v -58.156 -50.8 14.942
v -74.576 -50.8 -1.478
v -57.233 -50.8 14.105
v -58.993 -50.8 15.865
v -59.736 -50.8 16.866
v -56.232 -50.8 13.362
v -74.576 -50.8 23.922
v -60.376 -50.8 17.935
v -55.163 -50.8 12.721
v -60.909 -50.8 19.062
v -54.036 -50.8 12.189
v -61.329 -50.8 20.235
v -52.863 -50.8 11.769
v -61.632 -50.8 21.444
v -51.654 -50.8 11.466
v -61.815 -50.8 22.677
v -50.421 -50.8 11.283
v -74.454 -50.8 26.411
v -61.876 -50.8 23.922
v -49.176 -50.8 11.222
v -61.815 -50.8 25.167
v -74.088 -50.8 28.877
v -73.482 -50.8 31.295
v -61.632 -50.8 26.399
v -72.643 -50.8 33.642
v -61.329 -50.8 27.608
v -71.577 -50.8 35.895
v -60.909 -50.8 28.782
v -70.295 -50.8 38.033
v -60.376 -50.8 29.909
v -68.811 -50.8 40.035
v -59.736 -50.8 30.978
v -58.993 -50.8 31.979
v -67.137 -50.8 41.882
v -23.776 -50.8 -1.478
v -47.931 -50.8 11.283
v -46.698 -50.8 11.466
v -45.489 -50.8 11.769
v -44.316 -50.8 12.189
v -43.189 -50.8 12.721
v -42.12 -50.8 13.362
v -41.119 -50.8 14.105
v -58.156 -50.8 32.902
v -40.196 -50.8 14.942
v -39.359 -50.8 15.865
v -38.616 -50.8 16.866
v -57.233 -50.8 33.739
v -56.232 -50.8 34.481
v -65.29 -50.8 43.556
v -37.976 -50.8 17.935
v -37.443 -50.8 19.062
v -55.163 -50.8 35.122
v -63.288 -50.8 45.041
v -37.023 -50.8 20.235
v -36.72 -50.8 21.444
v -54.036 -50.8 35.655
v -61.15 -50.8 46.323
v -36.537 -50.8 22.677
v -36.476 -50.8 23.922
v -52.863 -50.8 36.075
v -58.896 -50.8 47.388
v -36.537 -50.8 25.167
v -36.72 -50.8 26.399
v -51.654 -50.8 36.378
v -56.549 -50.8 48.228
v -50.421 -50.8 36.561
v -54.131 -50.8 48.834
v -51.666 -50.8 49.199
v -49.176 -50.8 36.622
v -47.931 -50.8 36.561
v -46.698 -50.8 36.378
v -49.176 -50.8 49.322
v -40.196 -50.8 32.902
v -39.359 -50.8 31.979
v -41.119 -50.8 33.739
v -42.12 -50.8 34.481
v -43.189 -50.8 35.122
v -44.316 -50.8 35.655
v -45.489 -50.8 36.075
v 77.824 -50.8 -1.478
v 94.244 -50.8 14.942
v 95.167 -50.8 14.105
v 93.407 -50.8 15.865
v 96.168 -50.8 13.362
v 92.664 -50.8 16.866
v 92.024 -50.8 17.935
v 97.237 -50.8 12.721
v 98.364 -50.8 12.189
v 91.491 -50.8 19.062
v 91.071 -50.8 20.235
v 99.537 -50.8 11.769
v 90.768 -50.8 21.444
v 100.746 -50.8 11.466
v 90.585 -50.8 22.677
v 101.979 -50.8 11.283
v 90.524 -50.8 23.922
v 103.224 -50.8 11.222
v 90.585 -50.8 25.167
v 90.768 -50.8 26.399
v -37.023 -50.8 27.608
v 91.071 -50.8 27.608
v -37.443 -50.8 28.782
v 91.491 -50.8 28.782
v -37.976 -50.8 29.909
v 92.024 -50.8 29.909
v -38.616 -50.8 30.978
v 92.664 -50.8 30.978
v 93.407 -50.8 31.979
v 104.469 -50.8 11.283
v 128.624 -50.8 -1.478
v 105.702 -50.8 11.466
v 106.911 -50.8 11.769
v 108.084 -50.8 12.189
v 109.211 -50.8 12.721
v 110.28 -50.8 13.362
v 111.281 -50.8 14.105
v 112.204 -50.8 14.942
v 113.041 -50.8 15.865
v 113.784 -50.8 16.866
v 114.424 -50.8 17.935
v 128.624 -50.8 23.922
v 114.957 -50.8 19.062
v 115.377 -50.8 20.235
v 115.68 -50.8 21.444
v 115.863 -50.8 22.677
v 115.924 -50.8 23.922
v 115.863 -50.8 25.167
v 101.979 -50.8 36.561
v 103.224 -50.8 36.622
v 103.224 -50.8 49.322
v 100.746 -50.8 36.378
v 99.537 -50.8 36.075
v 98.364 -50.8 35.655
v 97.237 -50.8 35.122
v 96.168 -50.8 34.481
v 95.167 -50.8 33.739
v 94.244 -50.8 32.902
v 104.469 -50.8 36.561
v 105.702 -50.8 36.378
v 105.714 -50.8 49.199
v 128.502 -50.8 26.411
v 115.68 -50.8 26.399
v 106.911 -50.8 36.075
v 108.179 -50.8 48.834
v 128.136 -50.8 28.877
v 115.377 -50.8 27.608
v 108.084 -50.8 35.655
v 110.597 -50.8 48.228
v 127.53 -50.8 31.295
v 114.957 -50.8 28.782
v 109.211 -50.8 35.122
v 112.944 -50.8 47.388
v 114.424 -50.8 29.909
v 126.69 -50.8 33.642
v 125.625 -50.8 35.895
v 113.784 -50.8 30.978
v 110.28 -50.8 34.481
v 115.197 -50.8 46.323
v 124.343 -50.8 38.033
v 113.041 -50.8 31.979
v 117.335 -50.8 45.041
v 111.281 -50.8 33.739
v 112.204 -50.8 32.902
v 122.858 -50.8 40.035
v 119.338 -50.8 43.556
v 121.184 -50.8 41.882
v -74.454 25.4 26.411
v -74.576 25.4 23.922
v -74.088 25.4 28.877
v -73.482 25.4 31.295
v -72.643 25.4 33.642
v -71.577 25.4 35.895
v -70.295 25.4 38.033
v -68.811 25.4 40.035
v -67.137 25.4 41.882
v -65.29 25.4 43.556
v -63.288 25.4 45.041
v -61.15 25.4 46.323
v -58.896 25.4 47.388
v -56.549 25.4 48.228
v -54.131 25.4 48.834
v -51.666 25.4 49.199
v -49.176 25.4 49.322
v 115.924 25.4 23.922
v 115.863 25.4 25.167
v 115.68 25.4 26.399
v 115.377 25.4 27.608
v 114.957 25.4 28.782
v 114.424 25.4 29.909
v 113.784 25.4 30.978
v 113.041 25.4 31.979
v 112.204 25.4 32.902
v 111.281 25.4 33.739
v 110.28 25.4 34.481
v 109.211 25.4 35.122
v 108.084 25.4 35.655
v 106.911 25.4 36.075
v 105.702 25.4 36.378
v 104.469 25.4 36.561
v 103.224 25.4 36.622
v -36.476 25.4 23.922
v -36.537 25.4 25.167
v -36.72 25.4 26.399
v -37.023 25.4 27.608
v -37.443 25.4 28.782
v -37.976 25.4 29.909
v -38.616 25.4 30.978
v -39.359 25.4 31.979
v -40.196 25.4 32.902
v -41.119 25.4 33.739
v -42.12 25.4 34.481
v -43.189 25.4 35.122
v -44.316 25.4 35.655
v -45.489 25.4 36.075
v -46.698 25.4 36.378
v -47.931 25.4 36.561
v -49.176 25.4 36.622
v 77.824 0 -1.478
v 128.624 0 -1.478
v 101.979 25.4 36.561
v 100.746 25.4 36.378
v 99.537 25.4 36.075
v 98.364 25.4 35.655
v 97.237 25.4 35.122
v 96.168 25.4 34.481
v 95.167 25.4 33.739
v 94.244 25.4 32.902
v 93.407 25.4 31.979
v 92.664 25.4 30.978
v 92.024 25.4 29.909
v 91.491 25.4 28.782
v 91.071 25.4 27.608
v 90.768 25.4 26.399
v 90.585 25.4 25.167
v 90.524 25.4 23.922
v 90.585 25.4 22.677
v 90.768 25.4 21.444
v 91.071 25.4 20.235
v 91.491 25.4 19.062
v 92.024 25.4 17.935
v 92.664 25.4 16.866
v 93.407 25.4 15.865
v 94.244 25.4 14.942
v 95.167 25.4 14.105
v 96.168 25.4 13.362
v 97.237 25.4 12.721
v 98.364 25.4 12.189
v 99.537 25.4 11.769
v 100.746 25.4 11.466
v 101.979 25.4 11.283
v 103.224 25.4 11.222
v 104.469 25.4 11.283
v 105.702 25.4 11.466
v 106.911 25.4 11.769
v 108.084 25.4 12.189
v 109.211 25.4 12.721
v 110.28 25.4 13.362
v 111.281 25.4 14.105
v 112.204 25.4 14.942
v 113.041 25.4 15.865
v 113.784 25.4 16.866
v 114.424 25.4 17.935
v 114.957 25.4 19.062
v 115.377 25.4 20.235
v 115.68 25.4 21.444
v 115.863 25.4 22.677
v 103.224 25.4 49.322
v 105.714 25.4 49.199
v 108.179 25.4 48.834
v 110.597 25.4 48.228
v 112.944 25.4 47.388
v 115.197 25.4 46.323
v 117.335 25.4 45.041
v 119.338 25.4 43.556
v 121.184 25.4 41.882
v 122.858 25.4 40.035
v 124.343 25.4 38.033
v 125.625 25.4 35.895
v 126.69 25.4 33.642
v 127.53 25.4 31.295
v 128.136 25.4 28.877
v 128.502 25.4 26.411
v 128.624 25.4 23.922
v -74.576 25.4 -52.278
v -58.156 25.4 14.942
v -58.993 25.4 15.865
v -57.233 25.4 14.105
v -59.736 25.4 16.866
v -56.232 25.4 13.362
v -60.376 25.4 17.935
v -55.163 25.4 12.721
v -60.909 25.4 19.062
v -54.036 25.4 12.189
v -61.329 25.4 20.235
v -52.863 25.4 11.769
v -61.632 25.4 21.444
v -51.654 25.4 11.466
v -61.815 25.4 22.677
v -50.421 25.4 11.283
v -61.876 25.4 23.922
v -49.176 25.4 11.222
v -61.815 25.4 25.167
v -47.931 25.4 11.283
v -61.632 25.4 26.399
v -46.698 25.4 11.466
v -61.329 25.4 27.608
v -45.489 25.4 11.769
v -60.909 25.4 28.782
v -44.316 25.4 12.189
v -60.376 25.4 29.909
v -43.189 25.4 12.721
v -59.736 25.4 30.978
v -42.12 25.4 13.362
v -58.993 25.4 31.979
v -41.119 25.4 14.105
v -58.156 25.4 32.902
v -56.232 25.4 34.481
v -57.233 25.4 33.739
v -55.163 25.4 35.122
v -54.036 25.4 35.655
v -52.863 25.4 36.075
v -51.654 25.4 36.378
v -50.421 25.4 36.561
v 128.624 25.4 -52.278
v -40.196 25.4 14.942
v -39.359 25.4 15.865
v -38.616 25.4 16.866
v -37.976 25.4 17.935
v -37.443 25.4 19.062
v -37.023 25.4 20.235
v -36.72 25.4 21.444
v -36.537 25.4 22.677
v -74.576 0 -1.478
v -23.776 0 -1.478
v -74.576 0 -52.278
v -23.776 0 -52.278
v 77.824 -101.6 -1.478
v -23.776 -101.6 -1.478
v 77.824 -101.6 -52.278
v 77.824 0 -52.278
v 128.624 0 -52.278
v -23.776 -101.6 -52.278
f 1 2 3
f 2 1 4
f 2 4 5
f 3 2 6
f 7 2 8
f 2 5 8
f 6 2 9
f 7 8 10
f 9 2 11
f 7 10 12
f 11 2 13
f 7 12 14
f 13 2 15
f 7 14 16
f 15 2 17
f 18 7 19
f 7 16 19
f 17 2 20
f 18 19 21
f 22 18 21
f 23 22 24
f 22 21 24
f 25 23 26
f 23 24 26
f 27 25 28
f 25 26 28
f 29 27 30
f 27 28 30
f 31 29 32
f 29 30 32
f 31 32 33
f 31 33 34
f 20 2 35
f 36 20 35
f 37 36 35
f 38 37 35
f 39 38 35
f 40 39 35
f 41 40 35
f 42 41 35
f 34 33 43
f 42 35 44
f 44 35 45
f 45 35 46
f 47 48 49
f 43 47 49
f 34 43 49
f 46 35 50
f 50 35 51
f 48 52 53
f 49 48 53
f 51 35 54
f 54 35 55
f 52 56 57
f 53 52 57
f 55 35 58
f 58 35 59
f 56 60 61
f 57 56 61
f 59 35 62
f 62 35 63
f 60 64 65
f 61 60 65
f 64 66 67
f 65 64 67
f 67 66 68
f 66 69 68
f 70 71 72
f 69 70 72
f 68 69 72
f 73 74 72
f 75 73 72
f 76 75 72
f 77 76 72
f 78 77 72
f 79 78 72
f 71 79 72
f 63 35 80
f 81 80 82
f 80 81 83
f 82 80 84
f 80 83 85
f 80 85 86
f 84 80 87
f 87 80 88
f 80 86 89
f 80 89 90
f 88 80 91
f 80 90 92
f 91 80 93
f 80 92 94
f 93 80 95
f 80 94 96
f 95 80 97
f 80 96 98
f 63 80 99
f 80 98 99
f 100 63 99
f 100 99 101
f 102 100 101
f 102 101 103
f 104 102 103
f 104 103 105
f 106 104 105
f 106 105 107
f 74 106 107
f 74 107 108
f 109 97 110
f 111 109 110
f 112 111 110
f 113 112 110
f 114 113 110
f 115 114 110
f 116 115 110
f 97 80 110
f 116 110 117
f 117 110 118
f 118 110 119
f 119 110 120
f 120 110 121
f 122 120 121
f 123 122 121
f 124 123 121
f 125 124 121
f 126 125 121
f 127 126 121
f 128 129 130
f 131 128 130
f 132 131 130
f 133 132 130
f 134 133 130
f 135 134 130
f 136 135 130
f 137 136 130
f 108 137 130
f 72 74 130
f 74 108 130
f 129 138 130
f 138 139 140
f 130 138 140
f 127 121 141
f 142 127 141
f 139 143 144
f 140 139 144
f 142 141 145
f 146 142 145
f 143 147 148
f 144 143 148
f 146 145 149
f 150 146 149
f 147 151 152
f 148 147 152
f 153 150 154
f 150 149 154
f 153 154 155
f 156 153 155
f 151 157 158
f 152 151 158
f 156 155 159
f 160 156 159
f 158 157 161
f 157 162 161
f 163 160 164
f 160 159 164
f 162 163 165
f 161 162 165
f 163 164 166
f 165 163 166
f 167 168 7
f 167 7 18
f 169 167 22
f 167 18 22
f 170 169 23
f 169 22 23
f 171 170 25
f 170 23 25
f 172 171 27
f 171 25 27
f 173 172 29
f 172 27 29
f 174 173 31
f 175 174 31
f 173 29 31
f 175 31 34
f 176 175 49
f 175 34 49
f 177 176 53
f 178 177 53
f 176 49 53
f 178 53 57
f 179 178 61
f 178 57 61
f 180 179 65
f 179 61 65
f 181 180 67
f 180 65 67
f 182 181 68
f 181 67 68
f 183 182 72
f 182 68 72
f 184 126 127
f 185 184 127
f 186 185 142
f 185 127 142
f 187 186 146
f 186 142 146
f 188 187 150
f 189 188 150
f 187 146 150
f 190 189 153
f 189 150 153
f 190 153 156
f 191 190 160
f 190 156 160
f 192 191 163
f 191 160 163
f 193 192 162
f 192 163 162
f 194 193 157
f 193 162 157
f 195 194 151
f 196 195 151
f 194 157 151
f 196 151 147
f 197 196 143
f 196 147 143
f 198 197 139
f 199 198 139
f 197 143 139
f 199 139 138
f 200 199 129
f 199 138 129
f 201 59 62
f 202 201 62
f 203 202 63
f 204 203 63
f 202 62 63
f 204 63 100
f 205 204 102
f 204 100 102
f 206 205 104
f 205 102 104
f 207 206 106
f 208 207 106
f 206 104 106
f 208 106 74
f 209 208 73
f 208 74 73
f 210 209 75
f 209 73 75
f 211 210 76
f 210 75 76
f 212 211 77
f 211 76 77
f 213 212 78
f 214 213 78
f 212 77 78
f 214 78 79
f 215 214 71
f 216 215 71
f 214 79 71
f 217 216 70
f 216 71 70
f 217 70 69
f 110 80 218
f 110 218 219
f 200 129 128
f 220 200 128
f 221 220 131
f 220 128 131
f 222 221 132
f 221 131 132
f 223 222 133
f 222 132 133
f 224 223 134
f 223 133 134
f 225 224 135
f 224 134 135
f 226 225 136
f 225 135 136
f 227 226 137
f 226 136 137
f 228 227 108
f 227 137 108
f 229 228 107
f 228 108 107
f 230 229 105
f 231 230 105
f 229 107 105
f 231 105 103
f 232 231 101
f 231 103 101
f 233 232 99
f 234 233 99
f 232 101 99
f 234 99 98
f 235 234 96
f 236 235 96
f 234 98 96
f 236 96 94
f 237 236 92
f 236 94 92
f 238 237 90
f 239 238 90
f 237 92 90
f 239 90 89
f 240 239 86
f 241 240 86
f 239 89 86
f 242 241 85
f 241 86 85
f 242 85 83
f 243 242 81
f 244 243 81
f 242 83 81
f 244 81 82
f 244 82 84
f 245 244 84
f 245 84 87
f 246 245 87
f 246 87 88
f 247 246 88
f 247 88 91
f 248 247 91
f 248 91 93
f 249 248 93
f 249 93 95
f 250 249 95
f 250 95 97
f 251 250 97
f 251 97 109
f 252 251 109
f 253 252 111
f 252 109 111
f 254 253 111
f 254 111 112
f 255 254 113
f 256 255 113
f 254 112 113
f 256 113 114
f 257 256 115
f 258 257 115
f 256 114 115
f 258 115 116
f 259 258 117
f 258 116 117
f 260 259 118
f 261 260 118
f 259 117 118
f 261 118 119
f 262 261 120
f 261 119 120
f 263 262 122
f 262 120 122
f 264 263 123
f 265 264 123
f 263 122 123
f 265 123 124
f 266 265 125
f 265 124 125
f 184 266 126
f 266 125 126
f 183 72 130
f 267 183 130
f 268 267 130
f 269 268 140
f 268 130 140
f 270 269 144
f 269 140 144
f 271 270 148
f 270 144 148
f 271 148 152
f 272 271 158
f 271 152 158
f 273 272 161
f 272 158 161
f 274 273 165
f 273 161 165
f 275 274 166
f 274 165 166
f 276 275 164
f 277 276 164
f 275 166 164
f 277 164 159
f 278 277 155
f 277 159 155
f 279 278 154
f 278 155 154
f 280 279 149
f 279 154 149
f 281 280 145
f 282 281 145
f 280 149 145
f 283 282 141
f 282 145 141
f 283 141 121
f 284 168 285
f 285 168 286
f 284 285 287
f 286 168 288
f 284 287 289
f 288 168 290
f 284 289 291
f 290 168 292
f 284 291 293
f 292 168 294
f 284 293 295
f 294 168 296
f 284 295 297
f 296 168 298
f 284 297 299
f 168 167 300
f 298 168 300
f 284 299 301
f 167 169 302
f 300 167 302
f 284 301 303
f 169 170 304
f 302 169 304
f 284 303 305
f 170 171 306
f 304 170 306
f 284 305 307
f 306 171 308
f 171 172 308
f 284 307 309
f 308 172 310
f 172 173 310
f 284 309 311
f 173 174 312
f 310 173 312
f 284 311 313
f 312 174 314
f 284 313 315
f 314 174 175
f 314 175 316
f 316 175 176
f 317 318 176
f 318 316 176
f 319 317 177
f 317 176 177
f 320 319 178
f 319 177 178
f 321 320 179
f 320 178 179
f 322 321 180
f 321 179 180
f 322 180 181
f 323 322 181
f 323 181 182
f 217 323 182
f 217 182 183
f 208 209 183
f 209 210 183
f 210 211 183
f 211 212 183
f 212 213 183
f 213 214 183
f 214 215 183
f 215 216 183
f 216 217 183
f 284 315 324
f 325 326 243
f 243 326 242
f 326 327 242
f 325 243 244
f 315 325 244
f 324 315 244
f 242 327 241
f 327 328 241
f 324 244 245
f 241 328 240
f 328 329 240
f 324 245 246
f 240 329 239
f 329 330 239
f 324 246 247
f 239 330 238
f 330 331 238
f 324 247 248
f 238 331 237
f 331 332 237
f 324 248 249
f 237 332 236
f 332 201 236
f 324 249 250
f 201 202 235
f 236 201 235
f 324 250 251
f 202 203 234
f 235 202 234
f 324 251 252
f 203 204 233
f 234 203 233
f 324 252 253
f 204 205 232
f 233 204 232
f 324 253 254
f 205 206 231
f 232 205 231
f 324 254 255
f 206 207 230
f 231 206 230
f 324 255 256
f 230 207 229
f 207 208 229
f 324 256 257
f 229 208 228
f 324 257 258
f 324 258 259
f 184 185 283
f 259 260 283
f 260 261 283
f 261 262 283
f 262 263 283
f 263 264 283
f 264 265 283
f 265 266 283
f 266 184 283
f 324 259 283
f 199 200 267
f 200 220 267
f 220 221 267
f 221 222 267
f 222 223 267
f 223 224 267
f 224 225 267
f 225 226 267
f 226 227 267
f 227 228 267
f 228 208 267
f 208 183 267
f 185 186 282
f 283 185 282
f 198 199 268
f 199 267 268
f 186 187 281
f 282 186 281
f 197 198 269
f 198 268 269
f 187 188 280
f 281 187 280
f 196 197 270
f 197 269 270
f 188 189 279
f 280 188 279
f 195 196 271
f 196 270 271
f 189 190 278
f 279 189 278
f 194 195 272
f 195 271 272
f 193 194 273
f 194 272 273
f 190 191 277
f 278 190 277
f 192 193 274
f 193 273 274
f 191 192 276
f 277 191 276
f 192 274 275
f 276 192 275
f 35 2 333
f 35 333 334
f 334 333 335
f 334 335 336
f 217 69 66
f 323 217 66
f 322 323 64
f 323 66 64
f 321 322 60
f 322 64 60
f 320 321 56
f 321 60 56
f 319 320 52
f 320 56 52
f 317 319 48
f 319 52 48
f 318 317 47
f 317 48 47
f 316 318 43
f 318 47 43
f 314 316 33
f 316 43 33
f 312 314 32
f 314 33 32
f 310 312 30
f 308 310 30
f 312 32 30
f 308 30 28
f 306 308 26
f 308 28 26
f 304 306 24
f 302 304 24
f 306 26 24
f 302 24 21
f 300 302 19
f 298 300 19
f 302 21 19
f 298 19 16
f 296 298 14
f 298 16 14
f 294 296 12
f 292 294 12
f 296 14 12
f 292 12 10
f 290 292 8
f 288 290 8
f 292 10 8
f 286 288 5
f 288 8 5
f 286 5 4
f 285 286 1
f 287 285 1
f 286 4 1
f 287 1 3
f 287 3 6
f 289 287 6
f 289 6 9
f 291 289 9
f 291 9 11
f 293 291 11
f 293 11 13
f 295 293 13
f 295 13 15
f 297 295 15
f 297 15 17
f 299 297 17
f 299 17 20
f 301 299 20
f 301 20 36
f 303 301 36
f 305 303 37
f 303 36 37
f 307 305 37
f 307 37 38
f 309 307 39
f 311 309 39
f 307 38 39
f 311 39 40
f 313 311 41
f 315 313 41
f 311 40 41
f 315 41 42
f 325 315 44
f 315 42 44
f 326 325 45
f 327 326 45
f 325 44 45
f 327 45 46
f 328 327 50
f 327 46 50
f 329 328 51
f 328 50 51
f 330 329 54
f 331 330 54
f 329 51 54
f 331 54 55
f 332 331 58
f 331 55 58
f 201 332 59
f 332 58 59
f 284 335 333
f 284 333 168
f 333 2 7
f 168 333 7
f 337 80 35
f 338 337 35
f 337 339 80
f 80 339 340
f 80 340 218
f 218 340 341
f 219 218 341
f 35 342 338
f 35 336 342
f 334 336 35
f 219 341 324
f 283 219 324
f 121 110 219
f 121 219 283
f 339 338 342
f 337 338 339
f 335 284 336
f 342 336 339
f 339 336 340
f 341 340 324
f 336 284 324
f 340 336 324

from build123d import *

# Parameters (mm, degrees)
F0_W      = 203.2
F0_H      = 101.6
F1_DEPTH  = 76.2
F3_DEPTH  = 25.4
F2_W      = 50.8
F2_H      = 50.8
F4_DEPTH  = 76.2
F5_W      = 25.4
F5_H      = 50.8
F6_DEPTH  = 203.2
F7_DEPTH  = 25.4
F9_DEPTH  = 76.2
F11_DEPTH = 76.2


with BuildPart() as f1:
    # F0 (on Front) → F1 (new body)
    with BuildSketch(Plane.XZ):
        with Locations((27.0239350557, -1.4781945765)):
            Rectangle(F0_W, F0_H)
    extrude(amount=F1_DEPTH)

    # F3 (add): a face of the model
    f3_faces = [f1.faces().sort_by_distance(p)[0] for p in [
        (27.0239350557, 0, -1.4781945765),
    ]]
    extrude(f3_faces, amount=F3_DEPTH)

    # F2 (on face) → F4 (cut)
    with BuildSketch(Plane.XZ.offset(76.2)):
        with Locations((103.2239350557, -26.8781945765)):
            Rectangle(F2_W, F2_H)
        with Locations((-49.1760649443, -26.8781945765)):
            Rectangle(F2_W, F2_H)
    extrude(amount=-F4_DEPTH, mode=Mode.SUBTRACT)

    # F5 (on face) → F6 (cut)
    with BuildSketch(Plane.YZ.offset(128.6239350557)):
        with Locations((-63.5, 23.9218054235)):
            Rectangle(F5_W, F5_H)
    extrude(amount=-F6_DEPTH, mode=Mode.SUBTRACT)

    # F7 (add): a face of the model
    f7_faces = [f1.faces().sort_by_distance(p)[0] for p in [
        (27.0239350557, -76.2, -26.8781945765),
    ]]
    extrude(f7_faces, amount=F7_DEPTH)

    # F8 (on face) → F9 (cut)
    with BuildSketch(Plane.XZ.offset(50.8)):
        with BuildLine():
            Line((128.6239350557, 49.3218054235), (103.2239350557, 49.3218054235))
            ThreePointArc((103.2239350557, 49.3218054235), (121.1844472979, 41.8823176656), (128.6239350557, 23.9218054235))
            Line((128.6239350557, 23.9218054235), (128.6239350557, 49.3218054235))
        make_face()
        with BuildLine():
            Line((-49.1760649443, 49.3218054235), (-74.5760649443, 49.3218054235))
            Line((-74.5760649443, 49.3218054235), (-74.5760649443, 23.9218054235))
            ThreePointArc((-74.5760649443, 23.9218054235), (-67.1365771864, 41.8823176656), (-49.1760649443, 49.3218054235))
        make_face()
    extrude(amount=-F9_DEPTH, mode=Mode.SUBTRACT)

    # F10 (on face) → F11 (cut)
    with BuildSketch(Plane.XZ.offset(50.8)):
        with BuildLine():
            ThreePointArc((-36.4760649443, 23.9218054235), (-40.1958088232, 32.9020615446), (-49.1760649443, 36.6218054235))
            ThreePointArc((-49.1760649443, 36.6218054235), (-58.1563210653, 14.9415493024), (-36.4760649443, 23.9218054235))
        make_face()
        with BuildLine():
            ThreePointArc((115.9239350557, 23.9218054235), (112.2041911768, 32.9020615446), (103.2239350557, 36.6218054235))
            ThreePointArc((103.2239350557, 36.6218054235), (94.2436789347, 14.9415493024), (115.9239350557, 23.9218054235))
        make_face()
    extrude(amount=-F11_DEPTH, mode=Mode.SUBTRACT)


solid = f1.part
